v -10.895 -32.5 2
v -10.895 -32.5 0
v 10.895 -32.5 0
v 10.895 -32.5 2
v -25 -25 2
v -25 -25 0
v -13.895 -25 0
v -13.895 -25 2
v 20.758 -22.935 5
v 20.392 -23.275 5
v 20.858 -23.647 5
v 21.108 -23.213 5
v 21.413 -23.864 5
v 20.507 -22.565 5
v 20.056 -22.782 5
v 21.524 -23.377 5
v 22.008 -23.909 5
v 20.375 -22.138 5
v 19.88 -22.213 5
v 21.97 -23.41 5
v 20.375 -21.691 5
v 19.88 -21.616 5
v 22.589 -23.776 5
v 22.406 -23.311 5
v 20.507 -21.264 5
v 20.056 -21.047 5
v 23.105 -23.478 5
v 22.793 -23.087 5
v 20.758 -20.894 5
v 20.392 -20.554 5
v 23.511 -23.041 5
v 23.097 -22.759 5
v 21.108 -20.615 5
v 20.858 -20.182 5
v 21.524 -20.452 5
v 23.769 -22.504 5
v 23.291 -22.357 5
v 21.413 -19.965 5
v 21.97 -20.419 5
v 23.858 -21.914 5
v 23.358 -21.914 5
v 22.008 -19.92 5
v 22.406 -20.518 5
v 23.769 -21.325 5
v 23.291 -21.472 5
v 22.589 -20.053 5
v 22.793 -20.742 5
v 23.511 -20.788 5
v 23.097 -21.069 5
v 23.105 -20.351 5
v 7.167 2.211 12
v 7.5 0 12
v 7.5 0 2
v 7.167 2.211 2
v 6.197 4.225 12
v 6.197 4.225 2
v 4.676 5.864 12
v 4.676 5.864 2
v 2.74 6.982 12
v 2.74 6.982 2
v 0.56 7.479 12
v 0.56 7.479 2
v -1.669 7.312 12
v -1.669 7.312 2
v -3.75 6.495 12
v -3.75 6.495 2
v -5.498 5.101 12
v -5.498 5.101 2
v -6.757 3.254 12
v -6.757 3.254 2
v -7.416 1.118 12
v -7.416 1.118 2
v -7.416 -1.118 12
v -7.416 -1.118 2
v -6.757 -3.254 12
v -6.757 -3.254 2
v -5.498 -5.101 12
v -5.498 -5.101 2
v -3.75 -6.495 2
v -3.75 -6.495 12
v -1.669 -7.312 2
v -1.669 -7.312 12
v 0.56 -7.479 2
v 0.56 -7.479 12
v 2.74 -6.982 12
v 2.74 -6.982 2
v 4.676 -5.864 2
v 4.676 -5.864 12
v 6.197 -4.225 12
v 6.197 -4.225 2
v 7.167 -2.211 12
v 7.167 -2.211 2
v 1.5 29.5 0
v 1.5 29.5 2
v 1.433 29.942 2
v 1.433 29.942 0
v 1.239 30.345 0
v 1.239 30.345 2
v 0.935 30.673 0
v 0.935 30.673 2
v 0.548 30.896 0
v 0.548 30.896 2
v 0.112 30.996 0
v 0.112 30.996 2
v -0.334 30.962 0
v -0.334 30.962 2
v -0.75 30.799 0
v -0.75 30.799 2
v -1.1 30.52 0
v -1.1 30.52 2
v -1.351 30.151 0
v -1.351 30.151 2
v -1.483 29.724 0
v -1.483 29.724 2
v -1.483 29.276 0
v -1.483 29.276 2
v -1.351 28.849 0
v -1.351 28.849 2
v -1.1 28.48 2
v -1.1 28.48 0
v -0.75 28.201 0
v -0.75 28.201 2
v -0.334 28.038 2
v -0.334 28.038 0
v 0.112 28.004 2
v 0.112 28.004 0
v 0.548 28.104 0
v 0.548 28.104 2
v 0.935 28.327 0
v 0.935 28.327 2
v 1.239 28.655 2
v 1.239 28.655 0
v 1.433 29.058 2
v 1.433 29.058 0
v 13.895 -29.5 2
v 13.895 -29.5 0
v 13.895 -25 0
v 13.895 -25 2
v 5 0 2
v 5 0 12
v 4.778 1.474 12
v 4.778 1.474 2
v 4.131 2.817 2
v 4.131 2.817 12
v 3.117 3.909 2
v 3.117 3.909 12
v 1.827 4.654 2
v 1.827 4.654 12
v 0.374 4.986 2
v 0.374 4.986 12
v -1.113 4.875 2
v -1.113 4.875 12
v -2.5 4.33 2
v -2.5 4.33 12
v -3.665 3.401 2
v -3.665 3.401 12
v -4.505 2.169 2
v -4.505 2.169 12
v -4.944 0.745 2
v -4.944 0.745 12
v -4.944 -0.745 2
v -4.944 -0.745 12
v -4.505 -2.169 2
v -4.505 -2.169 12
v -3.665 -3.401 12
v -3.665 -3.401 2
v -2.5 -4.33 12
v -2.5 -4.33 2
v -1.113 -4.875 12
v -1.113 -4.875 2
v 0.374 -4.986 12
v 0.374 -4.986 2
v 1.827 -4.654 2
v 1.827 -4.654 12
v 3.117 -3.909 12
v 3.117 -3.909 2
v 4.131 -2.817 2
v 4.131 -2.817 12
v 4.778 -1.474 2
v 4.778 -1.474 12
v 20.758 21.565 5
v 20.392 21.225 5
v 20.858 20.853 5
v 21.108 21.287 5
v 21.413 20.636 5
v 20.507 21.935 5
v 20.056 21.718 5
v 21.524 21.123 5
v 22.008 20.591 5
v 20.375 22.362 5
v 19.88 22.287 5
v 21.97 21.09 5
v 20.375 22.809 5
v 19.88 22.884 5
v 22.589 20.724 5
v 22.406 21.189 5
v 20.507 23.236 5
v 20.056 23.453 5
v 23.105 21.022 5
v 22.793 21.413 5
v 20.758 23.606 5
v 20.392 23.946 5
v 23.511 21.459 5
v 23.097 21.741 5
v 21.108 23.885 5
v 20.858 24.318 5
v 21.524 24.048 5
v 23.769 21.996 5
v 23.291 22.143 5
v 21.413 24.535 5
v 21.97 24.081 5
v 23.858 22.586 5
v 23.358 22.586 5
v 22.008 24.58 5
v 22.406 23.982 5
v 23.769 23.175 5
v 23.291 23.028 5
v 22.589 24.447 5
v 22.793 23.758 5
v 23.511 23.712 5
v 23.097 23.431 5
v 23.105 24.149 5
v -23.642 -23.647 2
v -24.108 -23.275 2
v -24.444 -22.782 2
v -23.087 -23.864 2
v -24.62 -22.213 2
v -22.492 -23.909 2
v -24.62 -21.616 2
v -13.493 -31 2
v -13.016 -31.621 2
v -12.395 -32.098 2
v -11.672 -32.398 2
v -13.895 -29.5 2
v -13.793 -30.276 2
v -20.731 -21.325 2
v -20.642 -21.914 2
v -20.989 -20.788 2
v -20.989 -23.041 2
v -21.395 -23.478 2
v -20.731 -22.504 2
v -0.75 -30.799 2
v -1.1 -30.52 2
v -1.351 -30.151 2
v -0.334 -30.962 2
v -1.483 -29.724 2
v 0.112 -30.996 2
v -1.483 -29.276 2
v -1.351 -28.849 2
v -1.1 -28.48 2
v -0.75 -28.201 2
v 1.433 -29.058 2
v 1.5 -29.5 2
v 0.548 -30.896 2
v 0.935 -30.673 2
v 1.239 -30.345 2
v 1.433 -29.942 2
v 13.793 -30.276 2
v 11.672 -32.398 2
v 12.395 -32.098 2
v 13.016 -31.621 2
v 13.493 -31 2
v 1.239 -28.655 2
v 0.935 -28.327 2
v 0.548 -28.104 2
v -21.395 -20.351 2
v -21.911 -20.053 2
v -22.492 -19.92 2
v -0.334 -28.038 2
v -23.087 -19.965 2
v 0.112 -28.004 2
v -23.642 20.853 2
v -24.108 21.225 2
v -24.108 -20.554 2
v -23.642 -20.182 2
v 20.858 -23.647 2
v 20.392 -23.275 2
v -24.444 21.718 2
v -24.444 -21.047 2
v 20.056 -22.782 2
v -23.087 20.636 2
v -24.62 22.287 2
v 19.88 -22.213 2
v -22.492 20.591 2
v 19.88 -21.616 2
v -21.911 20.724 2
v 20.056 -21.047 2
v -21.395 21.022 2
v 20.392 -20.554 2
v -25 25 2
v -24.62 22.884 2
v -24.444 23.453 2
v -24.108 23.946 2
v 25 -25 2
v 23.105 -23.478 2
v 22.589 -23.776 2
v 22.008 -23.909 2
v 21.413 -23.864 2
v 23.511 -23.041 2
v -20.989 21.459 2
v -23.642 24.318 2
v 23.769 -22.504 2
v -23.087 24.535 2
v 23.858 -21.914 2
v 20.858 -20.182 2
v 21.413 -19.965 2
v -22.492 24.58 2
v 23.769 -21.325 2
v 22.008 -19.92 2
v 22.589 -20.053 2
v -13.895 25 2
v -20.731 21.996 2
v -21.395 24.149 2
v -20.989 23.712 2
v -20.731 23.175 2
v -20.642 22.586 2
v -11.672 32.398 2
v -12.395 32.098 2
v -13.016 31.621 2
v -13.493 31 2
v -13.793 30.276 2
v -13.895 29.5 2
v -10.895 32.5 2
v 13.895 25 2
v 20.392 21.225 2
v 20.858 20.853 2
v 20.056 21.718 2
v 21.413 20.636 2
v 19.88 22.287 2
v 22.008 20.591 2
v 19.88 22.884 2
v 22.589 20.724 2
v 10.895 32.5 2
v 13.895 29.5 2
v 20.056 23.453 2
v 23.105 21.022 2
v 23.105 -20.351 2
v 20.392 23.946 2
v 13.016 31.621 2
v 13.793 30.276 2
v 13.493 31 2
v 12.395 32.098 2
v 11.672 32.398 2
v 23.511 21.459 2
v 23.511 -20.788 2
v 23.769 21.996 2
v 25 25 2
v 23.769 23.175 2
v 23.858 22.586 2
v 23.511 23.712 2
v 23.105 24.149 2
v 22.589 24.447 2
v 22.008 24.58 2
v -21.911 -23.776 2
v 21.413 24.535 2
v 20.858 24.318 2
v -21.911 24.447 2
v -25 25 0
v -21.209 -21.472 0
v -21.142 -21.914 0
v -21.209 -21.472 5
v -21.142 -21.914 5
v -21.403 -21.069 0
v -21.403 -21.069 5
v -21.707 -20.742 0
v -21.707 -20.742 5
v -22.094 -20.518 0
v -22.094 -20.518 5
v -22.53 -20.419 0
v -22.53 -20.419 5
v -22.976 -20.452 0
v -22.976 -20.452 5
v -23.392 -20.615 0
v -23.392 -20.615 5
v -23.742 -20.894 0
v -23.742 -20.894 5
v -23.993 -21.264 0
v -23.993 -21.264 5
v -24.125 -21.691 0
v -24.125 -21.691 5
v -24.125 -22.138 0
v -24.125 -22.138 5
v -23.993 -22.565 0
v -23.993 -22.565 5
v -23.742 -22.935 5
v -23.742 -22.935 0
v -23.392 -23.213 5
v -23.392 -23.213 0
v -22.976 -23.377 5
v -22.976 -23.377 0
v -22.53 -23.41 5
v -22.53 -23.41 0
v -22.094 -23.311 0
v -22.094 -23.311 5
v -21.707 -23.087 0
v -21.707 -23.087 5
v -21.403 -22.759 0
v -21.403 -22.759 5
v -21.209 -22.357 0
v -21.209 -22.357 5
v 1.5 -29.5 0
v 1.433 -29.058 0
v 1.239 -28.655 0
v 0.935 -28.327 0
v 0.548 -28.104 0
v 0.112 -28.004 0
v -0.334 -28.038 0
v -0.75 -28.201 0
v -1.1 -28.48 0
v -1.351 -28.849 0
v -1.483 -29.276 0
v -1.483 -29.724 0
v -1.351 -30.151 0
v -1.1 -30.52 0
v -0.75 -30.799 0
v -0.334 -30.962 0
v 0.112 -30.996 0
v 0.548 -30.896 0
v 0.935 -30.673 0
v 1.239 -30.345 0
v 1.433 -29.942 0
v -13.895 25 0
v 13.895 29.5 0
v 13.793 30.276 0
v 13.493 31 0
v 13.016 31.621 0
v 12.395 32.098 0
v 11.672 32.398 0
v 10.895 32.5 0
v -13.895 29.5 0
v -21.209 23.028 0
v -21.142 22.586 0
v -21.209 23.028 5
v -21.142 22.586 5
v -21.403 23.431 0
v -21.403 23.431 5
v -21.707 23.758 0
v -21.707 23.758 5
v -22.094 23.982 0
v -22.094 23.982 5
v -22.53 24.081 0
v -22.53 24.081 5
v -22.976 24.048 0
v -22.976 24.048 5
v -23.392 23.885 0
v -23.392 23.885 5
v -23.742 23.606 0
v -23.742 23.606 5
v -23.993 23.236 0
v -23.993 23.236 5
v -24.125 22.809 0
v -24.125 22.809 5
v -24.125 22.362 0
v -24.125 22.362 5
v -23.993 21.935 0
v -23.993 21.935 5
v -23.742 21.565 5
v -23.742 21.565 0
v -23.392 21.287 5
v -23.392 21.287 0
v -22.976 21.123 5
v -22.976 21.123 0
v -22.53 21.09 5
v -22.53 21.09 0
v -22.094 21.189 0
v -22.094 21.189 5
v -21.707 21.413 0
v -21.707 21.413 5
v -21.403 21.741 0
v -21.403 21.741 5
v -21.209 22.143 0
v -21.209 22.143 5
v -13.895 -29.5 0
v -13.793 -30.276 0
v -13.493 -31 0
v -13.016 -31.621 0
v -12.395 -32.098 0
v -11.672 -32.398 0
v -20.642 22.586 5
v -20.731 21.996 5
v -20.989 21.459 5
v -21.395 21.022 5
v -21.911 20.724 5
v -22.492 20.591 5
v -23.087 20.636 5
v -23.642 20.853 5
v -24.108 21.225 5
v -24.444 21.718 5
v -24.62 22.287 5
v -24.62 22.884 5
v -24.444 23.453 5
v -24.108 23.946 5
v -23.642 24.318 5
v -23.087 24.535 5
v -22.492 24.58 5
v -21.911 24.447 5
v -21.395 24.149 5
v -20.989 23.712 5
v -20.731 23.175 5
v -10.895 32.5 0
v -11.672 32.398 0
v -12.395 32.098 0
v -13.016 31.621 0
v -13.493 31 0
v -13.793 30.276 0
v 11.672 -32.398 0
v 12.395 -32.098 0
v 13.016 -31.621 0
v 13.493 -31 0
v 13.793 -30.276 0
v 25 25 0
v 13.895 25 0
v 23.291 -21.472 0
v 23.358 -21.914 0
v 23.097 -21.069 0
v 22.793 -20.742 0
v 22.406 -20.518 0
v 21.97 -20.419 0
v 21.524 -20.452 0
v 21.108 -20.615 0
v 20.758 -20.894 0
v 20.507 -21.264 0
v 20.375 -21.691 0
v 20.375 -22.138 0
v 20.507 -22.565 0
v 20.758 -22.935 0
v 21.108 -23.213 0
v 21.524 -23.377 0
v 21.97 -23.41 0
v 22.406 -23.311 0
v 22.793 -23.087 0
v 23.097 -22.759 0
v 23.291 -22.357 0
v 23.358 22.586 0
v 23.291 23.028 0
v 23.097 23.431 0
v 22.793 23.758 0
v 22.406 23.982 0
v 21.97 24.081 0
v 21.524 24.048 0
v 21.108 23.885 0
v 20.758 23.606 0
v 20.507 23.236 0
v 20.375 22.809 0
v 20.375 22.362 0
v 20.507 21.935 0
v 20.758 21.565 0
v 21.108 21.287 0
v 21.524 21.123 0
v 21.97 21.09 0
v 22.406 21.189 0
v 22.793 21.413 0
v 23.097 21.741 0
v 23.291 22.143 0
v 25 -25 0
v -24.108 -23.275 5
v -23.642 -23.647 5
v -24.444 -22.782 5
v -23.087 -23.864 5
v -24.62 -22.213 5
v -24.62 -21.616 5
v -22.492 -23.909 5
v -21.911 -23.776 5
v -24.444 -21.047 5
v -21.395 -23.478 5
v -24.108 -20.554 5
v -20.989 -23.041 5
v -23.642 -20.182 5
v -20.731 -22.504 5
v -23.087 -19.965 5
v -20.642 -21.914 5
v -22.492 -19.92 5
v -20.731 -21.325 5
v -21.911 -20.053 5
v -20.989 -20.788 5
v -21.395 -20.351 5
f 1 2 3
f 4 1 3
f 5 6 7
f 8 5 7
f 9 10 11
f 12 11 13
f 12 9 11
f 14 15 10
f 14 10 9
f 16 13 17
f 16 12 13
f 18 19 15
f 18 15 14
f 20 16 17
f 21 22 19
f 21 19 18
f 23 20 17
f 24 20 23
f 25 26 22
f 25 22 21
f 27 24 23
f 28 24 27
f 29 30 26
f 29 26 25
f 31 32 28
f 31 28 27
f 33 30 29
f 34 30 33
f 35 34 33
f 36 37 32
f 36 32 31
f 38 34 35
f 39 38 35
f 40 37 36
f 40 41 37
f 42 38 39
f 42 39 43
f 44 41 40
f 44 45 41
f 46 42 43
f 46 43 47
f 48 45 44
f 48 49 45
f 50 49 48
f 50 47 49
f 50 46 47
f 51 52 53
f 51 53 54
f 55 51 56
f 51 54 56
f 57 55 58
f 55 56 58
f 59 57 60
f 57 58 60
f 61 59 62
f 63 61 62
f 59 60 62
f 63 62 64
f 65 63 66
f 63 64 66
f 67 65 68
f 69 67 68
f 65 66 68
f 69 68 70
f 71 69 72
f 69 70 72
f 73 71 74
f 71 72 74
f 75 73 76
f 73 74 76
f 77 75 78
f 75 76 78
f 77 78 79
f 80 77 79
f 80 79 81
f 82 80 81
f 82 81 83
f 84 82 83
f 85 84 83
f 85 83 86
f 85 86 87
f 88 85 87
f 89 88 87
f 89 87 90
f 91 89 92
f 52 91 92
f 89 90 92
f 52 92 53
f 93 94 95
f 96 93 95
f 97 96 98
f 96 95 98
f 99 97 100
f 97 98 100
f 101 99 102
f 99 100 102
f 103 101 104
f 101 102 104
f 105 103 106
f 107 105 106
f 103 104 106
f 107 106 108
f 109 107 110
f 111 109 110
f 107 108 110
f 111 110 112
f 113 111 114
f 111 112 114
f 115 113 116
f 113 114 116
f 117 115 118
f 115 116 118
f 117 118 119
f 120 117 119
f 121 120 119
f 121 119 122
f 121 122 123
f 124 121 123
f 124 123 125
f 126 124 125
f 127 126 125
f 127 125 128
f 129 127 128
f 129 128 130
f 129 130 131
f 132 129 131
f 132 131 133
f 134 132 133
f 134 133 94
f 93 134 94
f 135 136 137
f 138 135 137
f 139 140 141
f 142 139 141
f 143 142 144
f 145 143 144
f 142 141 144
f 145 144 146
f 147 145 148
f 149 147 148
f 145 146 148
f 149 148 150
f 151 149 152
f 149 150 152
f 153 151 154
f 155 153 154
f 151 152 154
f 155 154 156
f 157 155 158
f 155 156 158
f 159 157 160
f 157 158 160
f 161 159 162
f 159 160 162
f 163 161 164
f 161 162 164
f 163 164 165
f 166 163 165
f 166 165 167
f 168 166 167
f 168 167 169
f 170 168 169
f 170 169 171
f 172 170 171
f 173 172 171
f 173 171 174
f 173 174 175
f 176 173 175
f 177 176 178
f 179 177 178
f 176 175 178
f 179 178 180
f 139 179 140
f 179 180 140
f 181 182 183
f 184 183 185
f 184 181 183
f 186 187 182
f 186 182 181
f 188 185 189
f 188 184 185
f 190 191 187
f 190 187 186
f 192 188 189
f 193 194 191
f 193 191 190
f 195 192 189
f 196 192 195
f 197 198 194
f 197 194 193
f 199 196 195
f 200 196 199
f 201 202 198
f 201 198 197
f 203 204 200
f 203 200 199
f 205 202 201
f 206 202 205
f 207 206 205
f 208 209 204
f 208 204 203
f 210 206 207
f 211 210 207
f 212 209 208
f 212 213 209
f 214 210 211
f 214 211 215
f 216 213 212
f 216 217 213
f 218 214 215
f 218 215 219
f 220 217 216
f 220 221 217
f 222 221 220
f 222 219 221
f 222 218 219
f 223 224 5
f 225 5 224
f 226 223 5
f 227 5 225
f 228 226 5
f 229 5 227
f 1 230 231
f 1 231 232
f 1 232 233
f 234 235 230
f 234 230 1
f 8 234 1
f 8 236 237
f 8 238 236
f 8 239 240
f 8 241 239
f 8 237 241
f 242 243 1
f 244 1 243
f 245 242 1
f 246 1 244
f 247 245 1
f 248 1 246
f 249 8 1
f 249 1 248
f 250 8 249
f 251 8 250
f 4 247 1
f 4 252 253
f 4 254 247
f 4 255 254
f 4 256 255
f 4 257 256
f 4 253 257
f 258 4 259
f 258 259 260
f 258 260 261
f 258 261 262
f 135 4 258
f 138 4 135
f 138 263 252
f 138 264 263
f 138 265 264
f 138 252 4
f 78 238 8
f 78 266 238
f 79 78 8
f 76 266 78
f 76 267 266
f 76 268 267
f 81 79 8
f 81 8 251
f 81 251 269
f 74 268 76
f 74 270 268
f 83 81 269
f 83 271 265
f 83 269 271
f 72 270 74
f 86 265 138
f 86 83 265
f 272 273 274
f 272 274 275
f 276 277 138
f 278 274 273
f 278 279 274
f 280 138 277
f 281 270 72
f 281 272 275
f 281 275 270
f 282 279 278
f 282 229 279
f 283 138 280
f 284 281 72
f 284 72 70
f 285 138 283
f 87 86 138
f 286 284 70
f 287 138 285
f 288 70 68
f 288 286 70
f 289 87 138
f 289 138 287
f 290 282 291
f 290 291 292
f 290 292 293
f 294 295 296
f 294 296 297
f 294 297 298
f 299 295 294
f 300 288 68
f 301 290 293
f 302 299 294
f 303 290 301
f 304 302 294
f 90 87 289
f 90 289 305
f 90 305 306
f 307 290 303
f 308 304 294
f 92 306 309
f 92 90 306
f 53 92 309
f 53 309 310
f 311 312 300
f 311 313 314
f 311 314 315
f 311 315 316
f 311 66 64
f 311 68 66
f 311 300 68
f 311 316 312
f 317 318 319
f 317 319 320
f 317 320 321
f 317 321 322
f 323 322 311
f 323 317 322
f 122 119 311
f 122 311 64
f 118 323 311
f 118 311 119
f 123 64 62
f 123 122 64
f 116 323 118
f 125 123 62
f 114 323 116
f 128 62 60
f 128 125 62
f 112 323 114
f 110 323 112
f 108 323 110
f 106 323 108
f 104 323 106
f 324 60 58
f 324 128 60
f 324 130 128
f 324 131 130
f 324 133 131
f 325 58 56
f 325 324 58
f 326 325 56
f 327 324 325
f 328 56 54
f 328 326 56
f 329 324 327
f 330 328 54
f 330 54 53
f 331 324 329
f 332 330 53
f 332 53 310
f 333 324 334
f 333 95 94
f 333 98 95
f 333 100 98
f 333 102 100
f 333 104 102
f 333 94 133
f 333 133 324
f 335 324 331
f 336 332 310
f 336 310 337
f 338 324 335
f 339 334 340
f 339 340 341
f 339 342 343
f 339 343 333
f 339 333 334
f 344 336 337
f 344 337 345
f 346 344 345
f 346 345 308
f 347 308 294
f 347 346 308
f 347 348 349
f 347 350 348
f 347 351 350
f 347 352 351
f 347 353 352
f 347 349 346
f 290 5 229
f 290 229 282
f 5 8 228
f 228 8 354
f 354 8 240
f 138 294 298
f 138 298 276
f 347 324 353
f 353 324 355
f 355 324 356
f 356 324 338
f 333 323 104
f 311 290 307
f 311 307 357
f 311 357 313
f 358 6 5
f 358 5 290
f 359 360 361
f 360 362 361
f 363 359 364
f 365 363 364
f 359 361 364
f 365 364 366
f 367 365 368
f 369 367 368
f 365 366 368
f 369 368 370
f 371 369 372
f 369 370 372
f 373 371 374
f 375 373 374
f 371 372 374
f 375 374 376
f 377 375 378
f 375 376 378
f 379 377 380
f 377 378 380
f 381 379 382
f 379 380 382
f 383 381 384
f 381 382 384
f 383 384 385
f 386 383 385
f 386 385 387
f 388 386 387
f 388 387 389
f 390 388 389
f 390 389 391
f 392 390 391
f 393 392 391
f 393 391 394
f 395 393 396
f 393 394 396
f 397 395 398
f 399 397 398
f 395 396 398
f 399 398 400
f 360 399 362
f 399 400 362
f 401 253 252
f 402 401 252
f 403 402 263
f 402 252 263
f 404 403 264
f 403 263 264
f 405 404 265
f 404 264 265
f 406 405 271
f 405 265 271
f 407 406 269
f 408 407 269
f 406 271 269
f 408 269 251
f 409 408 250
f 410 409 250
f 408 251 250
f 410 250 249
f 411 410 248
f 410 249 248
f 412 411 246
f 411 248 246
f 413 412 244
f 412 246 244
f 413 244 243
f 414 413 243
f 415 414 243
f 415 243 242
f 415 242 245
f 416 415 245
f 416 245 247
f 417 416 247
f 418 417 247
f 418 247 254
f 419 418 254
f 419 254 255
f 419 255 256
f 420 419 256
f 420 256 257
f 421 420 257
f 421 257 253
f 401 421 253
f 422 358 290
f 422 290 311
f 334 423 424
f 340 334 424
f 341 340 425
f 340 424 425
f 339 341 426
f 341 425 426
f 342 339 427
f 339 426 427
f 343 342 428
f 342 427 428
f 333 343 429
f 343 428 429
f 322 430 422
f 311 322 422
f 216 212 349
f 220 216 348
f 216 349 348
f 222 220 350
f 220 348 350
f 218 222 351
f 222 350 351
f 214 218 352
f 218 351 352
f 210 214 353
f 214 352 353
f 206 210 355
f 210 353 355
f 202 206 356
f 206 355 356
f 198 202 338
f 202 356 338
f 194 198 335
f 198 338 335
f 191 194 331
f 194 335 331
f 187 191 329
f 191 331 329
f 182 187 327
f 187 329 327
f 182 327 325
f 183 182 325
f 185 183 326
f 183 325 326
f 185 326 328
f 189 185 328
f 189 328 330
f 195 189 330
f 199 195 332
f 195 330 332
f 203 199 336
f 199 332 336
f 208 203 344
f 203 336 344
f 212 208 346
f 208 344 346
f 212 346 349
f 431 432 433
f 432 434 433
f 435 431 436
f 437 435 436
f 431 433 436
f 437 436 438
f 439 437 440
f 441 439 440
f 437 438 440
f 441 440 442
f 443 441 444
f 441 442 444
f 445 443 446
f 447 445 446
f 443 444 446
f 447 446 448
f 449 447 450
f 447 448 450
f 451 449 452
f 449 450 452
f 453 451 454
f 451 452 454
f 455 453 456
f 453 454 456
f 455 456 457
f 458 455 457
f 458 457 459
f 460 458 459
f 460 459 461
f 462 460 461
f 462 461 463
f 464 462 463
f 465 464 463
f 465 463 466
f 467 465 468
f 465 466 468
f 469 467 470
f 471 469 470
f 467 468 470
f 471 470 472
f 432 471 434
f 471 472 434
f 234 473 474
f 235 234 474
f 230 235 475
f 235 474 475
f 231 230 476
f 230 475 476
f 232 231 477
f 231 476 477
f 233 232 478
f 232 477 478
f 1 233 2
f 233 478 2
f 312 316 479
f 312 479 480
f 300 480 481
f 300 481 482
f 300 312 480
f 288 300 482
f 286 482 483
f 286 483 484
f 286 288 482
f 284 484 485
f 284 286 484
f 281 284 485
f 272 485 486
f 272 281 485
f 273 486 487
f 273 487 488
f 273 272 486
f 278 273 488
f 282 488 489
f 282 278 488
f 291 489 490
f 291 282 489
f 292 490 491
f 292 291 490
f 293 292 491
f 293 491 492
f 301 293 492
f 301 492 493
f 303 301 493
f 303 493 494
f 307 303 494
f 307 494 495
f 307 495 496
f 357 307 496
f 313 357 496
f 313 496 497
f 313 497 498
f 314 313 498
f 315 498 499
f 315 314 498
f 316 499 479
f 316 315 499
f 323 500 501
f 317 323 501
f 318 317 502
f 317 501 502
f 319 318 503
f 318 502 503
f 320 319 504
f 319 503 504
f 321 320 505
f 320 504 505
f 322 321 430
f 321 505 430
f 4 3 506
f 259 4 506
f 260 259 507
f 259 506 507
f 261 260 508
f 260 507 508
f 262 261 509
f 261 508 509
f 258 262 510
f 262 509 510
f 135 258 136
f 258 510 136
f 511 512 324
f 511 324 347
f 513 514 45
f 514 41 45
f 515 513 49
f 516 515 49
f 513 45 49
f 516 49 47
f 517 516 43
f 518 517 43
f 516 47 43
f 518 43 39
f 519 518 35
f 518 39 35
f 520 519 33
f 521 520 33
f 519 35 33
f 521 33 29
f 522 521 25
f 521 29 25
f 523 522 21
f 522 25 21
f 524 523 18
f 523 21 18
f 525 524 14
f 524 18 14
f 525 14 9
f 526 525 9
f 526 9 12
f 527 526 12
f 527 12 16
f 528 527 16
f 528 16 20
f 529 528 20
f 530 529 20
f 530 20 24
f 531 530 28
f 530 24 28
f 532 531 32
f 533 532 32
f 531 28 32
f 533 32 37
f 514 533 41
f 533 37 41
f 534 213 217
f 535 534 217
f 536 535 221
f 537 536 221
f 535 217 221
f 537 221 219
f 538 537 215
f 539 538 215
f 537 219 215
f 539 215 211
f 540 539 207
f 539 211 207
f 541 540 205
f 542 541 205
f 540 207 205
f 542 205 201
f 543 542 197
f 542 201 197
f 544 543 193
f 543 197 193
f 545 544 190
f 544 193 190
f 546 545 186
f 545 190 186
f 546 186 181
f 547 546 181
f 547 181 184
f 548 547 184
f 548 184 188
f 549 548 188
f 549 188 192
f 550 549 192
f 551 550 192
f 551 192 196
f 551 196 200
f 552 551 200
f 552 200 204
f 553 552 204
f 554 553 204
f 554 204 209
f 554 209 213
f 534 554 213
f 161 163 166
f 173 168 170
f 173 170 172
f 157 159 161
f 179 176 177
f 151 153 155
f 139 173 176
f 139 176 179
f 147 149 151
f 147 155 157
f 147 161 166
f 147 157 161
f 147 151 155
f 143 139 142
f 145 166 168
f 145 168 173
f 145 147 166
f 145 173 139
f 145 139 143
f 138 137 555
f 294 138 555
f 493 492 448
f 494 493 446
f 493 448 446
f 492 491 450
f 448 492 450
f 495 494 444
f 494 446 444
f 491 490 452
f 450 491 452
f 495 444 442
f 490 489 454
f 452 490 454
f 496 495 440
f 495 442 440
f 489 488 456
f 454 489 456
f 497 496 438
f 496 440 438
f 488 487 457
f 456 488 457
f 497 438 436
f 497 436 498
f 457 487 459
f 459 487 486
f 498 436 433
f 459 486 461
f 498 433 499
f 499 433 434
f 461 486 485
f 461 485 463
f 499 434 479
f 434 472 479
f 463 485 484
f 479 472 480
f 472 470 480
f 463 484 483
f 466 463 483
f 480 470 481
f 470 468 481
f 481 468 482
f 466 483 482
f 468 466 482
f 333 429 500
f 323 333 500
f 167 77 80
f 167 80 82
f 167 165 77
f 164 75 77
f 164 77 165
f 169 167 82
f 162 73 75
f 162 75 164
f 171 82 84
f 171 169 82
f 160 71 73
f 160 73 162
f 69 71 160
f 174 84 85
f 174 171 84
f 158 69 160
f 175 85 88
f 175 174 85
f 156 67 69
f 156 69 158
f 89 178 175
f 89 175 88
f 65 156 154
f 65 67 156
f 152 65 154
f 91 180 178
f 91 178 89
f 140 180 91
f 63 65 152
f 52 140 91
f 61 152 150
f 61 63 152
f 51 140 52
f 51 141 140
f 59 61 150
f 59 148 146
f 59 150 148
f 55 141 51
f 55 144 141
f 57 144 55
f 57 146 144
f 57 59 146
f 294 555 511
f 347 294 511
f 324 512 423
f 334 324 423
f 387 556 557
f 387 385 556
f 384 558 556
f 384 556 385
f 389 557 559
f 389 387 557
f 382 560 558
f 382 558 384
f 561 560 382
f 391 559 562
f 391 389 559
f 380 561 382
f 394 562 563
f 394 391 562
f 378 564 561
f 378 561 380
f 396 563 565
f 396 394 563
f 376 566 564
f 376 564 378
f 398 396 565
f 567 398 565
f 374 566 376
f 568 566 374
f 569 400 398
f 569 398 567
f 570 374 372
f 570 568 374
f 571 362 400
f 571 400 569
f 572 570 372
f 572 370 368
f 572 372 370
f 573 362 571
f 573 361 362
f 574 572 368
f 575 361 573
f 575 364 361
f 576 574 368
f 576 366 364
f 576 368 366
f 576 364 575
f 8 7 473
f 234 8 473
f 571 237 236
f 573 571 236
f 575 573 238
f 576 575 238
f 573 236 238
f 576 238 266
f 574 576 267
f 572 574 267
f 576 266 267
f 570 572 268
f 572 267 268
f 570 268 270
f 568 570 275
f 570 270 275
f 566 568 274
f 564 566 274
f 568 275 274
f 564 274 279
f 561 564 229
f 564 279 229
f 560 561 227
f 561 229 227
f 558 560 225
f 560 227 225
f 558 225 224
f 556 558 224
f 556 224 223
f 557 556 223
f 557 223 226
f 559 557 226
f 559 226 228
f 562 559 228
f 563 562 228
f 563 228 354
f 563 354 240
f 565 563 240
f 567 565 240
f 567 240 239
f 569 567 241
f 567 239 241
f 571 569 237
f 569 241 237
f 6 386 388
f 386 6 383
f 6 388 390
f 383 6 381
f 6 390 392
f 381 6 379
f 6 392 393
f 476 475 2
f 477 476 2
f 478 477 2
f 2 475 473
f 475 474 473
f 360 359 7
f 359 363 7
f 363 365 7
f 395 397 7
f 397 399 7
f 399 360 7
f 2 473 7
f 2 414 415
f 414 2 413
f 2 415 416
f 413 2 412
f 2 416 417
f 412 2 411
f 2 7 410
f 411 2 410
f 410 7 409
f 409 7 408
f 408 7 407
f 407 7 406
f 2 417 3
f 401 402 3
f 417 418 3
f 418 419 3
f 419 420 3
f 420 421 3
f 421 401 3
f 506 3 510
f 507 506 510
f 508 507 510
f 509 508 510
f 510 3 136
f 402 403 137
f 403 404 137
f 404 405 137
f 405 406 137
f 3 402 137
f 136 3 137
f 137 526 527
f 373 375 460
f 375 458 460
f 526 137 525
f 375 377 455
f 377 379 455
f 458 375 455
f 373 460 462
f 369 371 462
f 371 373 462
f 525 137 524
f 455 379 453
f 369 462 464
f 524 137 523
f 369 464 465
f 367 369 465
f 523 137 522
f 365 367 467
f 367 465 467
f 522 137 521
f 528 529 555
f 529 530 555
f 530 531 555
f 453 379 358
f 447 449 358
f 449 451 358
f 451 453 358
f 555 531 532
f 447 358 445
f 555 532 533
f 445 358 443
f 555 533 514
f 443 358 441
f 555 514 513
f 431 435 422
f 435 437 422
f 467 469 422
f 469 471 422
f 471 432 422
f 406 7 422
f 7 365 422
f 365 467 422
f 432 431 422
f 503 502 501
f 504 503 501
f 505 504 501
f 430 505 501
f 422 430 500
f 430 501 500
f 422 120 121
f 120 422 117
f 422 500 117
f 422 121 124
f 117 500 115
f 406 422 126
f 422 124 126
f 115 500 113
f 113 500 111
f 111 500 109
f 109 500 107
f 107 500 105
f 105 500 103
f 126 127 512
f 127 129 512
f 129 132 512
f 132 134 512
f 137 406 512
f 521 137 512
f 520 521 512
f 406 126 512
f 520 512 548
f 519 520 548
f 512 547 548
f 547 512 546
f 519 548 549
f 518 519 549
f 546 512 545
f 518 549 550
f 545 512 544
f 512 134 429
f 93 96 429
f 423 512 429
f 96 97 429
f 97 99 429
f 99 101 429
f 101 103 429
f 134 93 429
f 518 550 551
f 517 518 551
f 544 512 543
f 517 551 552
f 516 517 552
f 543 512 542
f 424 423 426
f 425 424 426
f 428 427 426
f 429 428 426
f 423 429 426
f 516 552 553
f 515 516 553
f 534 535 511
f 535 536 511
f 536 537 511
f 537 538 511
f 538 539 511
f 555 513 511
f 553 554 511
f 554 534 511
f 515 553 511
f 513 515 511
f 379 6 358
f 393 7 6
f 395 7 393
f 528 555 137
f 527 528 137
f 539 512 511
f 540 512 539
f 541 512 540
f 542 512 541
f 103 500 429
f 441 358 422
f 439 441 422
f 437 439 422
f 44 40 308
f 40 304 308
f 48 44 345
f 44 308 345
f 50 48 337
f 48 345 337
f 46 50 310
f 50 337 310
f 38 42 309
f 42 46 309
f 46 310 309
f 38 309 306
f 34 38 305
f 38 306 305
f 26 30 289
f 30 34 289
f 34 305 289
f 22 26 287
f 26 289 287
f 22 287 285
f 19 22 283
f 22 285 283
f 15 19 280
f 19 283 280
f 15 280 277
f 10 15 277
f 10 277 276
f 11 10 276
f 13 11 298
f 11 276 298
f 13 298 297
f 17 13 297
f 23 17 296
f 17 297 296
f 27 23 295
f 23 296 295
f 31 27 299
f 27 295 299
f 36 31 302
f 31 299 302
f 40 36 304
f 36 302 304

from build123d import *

# Parameters (mm, degrees)
F0_W      = 50
F0_H      = 50
F1_DEPTH  = 2
F2_R      = 2
F3_DEPTH  = 3
F4_R      = 1.5
F5_DEPTH  = 3
F7_DEPTH  = 2
F8_R      = 1.5
F9_DEPTH  = 25
F10_R     = 7.5
F11_DEPTH = 10
F12_R     = 5
F13_DEPTH = 10
F14_DEPTH = 7.7


# Not quite as in the source:
# - a pattern or mirror of a feature is missing from the dataset's text; its kind, count and spacing are read off the source's solid
# - a feature names something its author has since deleted; it is built from what else it names


with BuildPart() as f1:
    # F0 (on Top) → F1 (new body)
    with BuildSketch(Plane.XY):
        Rectangle(F0_W, F0_H)
    extrude(amount=F1_DEPTH)

    # F2 (on face) → F3 (join)
    with BuildSketch(Plane.XY.offset(2)):
        with Locations((-22.6419584364, -21.9144617685)):
            Circle(F2_R)
        with Locations((21.8580415636, -21.9144617685)):
            Circle(F2_R)
        with Locations((21.8580415636, 22.5855382315)):
            Circle(F2_R)
    f3 = extrude(amount=F3_DEPTH)

    # F3_copies: F3 across plane
    add(f3.mirror(Plane.ZX.offset(0.335538)))

    # F4 (on face) → F5 (cut)
    with BuildSketch(Plane.XY.offset(5)):
        with Locations((-22.6419584364, 22.5855382315)):
            Circle(F4_R)
        with Locations((21.8580415636, -21.9144617685)):
            Circle(F4_R)
        with Locations((21.8580415636, 22.5855382315)):
            Circle(F4_R)
        with Locations((-22.6419584364, -21.9144617685)):
            Circle(F4_R)
    extrude(amount=-F5_DEPTH, mode=Mode.SUBTRACT)

    # F6 (on Top) → F7 (join)
    with BuildSketch(Plane.XY):
        with BuildLine():
            ThreePointArc((13.8950906601, 29.5), (13.0164110037, 31.6213203436), (10.8950906601, 32.5))
            Line((10.8950906601, 32.5), (-10.8950906601, 32.5))
            ThreePointArc((-10.8950906601, 32.5), (-13.0164110037, 31.6213203436), (-13.8950906601, 29.5))
            Line((-13.8950906601, 29.5), (-13.8950906601, 25))
            Line((-13.8950906601, 25), (13.8950906601, 25))
            Line((13.8950906601, 25), (13.8950906601, 29.5))
        make_face()
        with BuildLine():
            Line((13.8950906601, -25), (-13.8950906601, -25))
            Line((-13.8950906601, -25), (-13.8950906601, -29.5))
            ThreePointArc((-13.8950906601, -29.5), (-13.0164110037, -31.6213203436), (-10.8950906601, -32.5))
            Line((-10.8950906601, -32.5), (10.8950906601, -32.5))
            ThreePointArc((10.8950906601, -32.5), (13.0164110037, -31.6213203436), (13.8950906601, -29.5))
            Line((13.8950906601, -29.5), (13.8950906601, -25))
        make_face()
    extrude(amount=F7_DEPTH)

    # F8 (on face) → F9 (cut)
    with BuildSketch(Plane.XY.offset(2)):
        with Locations((0, 29.5)):
            Circle(F8_R)
        with Locations((0, -29.5)):
            Circle(F8_R)
    extrude(amount=-F9_DEPTH, mode=Mode.SUBTRACT)

    # F10 (on face) → F11 (join)
    with BuildSketch(Plane.XY.offset(2)):
        Circle(F10_R)
    extrude(amount=F11_DEPTH)

    # F12 (on face) → F13 (cut)
    with BuildSketch(Plane.XY.offset(12)):
        Circle(F12_R)
    extrude(amount=-F13_DEPTH, mode=Mode.SUBTRACT)

    # F14 (cut): faces of the model
    f14_faces = [f1.faces().sort_by_distance(p)[0] for p in [
        (-22.6419584364, -21.9144617685, 2),
        (-22.6419584364, 22.5855382315, 2),
        (21.8580415636, 22.5855382315, 2),
        (21.8580415636, -21.9144617685, 2),
    ]]
    extrude(f14_faces, amount=-F14_DEPTH, mode=Mode.SUBTRACT)


solid = f1.part
